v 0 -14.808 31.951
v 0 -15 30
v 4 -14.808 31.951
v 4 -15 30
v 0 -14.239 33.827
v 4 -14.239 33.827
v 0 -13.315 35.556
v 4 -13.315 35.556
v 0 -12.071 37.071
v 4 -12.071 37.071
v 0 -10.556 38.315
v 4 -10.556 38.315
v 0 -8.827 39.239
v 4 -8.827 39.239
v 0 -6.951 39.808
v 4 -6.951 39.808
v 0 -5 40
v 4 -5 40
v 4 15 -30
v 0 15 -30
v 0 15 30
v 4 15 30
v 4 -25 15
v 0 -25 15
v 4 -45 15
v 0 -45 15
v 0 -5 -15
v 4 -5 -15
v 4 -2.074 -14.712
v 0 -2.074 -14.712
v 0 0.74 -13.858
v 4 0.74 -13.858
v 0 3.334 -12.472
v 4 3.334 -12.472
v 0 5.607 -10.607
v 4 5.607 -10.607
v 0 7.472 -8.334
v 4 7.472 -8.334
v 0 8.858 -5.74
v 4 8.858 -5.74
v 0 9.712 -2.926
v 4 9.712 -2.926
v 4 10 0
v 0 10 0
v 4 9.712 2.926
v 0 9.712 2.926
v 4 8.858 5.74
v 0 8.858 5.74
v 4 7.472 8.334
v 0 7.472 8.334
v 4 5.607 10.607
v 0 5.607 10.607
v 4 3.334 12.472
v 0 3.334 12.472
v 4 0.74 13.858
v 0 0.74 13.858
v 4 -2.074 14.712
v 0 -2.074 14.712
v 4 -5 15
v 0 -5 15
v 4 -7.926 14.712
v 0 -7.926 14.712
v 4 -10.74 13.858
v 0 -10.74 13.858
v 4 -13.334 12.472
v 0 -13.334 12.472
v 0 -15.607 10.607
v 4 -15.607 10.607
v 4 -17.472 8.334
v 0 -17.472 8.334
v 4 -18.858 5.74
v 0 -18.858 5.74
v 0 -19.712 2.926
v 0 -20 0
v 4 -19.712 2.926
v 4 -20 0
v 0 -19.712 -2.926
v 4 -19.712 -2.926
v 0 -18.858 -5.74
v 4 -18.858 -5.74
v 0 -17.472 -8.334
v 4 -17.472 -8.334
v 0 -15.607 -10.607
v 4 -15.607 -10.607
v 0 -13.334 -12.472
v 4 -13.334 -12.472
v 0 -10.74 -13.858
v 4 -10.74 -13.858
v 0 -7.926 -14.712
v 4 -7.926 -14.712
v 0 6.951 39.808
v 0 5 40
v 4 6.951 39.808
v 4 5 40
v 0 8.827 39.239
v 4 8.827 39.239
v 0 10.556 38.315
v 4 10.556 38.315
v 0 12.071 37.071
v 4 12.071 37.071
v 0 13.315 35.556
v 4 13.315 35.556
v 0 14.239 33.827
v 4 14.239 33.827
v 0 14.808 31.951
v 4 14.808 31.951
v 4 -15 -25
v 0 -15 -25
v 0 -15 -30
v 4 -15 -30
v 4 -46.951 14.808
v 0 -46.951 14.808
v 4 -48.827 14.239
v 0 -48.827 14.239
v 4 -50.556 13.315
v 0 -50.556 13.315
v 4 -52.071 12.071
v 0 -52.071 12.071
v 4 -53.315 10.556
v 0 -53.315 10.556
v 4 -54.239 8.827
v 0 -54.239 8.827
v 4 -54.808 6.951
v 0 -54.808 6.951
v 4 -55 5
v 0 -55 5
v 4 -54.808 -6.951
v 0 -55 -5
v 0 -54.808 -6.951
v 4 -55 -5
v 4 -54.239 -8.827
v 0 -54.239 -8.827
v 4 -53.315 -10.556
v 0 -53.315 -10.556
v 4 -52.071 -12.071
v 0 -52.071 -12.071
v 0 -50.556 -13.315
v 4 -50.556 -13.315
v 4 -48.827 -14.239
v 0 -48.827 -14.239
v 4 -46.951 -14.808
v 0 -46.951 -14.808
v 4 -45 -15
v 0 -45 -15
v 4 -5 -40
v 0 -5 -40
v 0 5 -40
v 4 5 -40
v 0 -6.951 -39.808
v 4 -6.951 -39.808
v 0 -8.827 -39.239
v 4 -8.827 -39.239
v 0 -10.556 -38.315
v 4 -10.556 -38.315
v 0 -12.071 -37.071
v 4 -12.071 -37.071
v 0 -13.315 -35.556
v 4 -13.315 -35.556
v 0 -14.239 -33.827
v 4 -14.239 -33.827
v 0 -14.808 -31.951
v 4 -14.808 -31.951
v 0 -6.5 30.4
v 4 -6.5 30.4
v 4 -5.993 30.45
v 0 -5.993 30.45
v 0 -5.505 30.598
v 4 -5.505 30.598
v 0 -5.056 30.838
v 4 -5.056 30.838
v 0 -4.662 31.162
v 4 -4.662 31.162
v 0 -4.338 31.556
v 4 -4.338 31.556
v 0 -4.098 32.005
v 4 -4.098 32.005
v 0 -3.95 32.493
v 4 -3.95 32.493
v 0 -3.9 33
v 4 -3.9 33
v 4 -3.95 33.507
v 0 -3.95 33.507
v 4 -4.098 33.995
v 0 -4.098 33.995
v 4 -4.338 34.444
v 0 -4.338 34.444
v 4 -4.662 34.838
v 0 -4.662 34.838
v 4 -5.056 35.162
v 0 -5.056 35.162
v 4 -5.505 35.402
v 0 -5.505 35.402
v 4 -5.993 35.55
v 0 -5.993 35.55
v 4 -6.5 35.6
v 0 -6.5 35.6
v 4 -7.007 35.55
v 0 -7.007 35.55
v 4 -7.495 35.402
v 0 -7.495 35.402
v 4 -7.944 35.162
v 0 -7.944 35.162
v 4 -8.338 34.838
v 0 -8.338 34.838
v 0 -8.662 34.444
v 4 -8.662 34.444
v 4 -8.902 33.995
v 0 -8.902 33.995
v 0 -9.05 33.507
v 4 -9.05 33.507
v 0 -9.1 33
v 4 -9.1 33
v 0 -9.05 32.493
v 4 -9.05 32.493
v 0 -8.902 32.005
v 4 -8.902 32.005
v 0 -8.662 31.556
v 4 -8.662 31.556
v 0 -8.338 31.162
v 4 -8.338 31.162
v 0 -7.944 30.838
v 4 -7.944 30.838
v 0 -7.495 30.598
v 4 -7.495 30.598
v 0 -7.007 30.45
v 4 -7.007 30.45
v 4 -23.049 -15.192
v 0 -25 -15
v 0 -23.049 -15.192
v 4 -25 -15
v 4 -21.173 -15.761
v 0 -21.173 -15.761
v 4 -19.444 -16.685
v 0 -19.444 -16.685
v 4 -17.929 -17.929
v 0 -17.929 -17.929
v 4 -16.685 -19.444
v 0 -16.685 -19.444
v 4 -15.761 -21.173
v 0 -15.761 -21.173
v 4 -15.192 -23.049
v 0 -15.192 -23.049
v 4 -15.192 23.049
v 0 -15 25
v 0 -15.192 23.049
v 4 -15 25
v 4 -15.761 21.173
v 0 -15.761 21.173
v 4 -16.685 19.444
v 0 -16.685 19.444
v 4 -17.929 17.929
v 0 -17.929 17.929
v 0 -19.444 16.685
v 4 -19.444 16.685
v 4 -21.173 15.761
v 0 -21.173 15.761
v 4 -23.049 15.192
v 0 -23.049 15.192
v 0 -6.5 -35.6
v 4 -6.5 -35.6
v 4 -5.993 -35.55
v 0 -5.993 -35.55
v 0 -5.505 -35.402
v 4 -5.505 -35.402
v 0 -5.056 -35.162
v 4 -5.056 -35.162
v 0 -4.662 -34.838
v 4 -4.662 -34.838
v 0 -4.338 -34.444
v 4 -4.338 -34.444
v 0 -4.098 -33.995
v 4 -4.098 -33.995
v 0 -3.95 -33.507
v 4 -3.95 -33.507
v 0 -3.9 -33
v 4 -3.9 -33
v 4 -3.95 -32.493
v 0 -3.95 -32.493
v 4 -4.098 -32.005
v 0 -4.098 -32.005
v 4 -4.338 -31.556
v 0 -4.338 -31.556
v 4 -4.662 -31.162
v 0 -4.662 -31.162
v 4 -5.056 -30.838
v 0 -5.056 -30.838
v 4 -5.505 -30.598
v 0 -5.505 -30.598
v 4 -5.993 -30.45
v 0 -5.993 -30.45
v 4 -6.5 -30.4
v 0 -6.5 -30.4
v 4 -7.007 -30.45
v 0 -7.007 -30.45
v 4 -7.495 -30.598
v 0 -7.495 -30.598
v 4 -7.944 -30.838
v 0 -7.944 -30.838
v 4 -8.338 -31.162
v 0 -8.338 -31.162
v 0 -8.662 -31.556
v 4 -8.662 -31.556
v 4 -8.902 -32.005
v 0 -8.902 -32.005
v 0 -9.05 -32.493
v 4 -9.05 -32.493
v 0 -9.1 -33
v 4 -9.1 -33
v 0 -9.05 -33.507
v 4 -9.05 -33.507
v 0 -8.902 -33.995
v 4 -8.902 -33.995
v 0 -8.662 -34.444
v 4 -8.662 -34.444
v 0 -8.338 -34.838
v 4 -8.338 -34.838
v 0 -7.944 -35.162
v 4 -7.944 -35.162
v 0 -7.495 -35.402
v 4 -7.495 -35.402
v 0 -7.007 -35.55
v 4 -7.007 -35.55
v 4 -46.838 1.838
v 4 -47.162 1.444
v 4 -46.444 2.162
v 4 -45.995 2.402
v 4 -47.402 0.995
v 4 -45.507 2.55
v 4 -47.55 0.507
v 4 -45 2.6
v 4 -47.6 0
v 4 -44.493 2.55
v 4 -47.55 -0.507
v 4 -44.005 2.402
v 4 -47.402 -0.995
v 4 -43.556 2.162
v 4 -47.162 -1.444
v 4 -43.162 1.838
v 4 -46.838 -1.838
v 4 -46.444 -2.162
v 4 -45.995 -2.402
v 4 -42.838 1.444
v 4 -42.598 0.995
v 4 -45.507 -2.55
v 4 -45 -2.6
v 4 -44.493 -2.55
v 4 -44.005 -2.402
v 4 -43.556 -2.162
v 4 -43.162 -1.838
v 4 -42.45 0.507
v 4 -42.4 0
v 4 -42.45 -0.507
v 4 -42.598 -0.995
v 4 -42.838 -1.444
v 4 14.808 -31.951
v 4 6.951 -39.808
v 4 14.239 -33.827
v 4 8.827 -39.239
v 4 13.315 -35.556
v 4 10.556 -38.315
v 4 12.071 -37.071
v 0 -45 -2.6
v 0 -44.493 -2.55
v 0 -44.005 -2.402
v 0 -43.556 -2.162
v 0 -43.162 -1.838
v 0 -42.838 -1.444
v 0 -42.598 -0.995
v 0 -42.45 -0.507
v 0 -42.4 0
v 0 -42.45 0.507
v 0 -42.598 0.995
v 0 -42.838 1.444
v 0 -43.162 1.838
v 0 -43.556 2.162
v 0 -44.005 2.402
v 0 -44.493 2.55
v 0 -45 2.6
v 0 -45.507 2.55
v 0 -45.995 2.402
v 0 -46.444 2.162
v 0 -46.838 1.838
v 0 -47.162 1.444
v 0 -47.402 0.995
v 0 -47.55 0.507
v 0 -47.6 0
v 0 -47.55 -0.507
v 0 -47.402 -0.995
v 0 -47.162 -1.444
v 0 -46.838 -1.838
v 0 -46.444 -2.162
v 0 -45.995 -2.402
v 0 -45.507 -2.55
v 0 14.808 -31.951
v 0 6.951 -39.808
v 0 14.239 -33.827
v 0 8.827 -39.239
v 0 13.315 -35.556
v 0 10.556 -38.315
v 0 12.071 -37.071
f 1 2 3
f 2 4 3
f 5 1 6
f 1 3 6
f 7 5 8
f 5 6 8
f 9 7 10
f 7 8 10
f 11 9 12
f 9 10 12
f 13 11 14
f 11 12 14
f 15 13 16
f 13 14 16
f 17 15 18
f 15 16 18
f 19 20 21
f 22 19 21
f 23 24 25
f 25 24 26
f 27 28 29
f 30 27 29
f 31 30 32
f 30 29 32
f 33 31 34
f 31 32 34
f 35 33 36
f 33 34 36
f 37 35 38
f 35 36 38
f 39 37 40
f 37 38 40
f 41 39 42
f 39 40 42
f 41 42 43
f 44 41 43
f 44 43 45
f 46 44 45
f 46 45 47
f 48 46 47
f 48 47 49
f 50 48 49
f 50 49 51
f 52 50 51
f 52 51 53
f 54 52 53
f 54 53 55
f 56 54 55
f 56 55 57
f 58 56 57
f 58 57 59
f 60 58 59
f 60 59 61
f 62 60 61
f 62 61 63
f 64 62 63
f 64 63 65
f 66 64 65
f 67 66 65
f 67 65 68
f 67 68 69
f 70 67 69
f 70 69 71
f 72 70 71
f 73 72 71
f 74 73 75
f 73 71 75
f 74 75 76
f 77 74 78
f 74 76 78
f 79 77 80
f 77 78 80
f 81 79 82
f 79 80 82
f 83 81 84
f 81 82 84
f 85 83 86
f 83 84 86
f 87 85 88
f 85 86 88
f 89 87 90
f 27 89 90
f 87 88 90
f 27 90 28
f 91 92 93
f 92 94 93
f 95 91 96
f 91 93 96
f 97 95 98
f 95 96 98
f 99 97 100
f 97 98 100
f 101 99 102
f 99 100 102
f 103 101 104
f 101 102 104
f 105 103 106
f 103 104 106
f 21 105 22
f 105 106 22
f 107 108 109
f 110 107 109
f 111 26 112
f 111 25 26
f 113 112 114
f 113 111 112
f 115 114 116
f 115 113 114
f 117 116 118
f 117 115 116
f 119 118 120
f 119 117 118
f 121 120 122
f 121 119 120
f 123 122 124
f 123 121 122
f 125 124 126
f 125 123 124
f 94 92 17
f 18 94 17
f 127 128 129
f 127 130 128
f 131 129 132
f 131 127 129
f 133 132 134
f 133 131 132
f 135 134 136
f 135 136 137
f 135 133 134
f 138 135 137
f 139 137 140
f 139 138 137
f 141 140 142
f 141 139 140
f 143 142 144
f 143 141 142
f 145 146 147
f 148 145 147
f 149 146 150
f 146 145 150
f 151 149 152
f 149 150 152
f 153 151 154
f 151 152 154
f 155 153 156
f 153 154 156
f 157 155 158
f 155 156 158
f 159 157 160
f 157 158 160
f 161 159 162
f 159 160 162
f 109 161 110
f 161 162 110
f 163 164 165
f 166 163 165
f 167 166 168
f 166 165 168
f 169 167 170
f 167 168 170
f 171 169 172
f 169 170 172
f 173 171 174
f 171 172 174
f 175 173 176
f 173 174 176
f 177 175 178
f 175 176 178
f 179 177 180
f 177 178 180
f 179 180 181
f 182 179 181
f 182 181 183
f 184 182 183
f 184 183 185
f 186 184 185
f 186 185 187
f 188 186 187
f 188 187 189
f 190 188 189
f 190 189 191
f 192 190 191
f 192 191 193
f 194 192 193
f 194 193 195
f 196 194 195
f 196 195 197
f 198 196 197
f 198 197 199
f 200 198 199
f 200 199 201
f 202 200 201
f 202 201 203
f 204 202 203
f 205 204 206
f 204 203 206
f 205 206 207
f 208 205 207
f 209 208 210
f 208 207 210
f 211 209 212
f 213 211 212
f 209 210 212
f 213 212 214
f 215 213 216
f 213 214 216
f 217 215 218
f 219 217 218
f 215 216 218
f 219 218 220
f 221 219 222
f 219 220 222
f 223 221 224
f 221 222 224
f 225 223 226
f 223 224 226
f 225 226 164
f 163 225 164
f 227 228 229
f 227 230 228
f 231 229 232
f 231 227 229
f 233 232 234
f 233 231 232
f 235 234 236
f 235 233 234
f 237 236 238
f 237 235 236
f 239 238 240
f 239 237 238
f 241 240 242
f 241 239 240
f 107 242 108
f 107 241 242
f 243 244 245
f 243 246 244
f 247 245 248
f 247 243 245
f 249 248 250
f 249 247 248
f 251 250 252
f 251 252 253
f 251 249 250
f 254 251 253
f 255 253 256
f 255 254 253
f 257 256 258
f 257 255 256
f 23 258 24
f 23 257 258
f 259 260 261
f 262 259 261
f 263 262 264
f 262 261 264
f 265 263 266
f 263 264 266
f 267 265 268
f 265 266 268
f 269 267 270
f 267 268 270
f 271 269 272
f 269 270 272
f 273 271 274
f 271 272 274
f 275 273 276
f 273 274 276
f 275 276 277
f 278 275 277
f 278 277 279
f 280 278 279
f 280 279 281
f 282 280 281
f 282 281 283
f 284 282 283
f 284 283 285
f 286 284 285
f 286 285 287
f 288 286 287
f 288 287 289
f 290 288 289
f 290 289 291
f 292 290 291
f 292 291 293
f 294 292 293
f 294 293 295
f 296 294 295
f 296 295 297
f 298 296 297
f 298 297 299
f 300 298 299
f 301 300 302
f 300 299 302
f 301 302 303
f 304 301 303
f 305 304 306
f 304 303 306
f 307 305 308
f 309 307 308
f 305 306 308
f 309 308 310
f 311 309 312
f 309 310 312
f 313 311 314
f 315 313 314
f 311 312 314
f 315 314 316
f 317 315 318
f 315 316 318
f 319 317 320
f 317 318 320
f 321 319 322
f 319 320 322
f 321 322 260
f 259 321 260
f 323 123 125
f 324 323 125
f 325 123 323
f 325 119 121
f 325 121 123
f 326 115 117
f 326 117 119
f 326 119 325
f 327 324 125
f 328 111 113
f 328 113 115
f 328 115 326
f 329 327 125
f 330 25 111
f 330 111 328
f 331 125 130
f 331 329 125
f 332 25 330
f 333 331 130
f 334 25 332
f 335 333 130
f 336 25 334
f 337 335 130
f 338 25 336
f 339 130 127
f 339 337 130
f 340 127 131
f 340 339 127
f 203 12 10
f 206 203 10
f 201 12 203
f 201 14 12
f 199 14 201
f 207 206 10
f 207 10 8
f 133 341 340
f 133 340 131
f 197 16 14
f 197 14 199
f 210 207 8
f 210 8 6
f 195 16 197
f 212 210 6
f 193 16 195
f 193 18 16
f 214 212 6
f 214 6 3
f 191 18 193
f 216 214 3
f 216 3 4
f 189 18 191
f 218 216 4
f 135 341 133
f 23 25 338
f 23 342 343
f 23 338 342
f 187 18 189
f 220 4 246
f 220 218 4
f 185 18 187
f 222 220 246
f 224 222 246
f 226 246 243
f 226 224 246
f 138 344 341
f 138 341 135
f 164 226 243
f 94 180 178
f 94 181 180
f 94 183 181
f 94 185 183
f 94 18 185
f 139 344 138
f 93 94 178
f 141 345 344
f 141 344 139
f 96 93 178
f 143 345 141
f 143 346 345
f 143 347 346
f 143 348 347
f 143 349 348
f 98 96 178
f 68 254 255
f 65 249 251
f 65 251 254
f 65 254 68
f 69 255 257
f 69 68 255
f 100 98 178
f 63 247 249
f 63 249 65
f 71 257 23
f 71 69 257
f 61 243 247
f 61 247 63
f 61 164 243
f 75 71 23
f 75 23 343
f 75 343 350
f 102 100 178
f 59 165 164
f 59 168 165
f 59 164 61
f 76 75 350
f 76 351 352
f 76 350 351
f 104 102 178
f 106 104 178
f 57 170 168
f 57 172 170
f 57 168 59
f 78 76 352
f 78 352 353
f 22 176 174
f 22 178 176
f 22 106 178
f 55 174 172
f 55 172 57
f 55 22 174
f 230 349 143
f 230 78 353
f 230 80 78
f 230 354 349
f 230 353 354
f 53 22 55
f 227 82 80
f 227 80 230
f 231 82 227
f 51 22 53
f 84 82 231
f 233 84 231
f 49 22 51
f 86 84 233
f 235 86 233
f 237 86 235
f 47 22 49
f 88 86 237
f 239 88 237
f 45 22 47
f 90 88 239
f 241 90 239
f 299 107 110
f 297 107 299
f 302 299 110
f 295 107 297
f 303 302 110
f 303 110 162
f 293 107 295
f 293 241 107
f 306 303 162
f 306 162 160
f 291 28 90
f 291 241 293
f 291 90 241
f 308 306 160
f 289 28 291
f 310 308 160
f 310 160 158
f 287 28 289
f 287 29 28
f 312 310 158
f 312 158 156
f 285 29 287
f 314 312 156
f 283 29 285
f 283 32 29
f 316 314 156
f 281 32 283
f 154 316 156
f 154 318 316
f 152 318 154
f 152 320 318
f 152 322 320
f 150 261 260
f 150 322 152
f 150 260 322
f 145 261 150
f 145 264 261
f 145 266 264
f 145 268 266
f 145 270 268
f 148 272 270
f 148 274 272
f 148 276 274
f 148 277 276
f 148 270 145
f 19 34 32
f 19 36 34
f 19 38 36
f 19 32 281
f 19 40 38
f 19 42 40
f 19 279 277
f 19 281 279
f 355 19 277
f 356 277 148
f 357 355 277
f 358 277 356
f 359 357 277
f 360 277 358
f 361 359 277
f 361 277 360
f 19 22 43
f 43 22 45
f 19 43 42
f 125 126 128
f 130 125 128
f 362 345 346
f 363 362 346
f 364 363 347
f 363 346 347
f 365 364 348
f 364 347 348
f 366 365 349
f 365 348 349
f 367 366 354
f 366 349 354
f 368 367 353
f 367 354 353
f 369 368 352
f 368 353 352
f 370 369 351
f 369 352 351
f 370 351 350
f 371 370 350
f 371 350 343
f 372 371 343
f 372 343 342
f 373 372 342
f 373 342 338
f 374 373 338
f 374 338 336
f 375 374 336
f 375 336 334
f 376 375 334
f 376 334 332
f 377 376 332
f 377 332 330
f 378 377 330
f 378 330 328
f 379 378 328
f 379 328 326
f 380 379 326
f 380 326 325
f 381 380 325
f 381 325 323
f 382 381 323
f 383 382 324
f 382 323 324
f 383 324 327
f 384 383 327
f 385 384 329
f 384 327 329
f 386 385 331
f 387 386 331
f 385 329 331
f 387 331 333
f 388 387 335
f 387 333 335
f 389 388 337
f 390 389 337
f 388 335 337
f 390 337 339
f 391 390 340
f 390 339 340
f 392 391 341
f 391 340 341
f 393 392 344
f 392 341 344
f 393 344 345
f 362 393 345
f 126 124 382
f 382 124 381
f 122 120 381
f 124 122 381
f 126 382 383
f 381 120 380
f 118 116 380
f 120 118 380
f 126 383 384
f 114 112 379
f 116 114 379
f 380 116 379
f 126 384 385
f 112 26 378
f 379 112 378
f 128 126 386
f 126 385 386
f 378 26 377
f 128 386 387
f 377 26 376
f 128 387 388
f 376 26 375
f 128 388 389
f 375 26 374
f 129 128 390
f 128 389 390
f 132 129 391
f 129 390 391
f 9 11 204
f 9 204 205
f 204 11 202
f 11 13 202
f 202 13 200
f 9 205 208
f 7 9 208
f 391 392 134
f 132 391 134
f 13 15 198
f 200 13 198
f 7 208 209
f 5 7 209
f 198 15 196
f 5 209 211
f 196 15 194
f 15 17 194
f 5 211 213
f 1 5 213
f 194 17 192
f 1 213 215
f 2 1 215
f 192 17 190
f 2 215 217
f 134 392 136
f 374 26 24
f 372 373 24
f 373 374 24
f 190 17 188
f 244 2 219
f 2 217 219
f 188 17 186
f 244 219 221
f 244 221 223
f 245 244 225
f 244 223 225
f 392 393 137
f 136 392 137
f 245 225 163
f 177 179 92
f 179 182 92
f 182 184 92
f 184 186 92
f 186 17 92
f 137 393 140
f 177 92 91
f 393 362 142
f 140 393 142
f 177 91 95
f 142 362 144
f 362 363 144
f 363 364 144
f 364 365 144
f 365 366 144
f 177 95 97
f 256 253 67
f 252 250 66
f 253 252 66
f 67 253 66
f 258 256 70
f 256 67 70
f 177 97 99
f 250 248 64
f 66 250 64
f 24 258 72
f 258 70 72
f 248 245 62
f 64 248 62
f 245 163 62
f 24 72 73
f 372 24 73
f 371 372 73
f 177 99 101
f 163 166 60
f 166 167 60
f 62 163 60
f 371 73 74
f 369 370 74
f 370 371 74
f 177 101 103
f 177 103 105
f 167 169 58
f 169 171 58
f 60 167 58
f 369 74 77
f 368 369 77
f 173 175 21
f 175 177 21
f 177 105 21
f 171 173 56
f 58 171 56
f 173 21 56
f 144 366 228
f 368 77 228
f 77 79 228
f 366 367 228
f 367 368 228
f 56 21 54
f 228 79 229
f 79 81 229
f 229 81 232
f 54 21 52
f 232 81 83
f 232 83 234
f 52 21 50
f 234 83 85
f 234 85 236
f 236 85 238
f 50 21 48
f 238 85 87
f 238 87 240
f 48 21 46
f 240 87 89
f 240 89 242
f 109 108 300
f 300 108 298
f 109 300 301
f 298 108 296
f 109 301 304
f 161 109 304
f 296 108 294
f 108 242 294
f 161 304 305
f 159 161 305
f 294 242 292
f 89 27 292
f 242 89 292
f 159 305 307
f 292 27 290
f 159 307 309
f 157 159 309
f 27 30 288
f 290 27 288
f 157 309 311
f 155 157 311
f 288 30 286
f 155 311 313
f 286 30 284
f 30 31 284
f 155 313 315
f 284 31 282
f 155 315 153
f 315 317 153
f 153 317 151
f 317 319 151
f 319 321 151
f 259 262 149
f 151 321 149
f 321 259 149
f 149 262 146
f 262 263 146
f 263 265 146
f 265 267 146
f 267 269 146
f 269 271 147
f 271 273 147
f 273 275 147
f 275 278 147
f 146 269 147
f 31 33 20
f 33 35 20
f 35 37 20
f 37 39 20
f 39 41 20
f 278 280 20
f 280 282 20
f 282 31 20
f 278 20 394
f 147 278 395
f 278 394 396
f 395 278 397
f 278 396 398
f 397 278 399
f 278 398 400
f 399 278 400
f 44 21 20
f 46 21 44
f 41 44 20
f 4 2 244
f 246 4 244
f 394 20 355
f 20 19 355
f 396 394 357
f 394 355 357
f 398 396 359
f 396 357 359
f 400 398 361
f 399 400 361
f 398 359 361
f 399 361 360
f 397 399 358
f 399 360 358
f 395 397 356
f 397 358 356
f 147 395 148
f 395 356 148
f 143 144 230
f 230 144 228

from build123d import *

# Parameters (mm, degrees)
BOSS_EXTRUDE1_DEPTH = 4
SKETCH2_R           = 15
SKETCH2_R_2         = 2.6
CUT_EXTRUDE1_DEPTH  = 5
FILLET1_R           = 10


with BuildPart() as part:
    # Sketch1 → Boss-Extrude1 (new body)
    with BuildSketch(Plane(origin=(0, 0, 0), x_dir=(0, 0, -1), z_dir=(1, 0, 0))):
        Polygon((-40, -15), (-15, -15), (-15, -55), (15, -55), (15, -15), (40, -15), (40, 15), (-40, 15), align=None)
    extrude(amount=BOSS_EXTRUDE1_DEPTH)

    # Sketch2 → Cut-Extrude1 (cut)
    with BuildSketch(Plane(origin=(4, 0, 0), x_dir=(0, 0, -1), z_dir=(1, 0, 0))):
        with Locations((0, -5)):
            Circle(SKETCH2_R)
        with Locations((0, -45)):
            Circle(SKETCH2_R_2)
        with Locations((-33, -6.5)):
            Circle(SKETCH2_R_2)
        with Locations((33, -6.5)):
            Circle(SKETCH2_R_2)
    extrude(amount=-CUT_EXTRUDE1_DEPTH, mode=Mode.SUBTRACT)

    # Fillet1
    fillet1_edges = [part.edges().sort_by_distance(p)[0] for p in [
        (2, 15, 40),
        (2, 15, -40),
        (2, -15, -40),
        (2, -15, -15),
        (2, -55, -15),
        (2, -55, 15),
        (2, -15, 15),
        (2, -15, 40),
    ]]
    fillet(fillet1_edges, radius=FILLET1_R)


solid = part.part
